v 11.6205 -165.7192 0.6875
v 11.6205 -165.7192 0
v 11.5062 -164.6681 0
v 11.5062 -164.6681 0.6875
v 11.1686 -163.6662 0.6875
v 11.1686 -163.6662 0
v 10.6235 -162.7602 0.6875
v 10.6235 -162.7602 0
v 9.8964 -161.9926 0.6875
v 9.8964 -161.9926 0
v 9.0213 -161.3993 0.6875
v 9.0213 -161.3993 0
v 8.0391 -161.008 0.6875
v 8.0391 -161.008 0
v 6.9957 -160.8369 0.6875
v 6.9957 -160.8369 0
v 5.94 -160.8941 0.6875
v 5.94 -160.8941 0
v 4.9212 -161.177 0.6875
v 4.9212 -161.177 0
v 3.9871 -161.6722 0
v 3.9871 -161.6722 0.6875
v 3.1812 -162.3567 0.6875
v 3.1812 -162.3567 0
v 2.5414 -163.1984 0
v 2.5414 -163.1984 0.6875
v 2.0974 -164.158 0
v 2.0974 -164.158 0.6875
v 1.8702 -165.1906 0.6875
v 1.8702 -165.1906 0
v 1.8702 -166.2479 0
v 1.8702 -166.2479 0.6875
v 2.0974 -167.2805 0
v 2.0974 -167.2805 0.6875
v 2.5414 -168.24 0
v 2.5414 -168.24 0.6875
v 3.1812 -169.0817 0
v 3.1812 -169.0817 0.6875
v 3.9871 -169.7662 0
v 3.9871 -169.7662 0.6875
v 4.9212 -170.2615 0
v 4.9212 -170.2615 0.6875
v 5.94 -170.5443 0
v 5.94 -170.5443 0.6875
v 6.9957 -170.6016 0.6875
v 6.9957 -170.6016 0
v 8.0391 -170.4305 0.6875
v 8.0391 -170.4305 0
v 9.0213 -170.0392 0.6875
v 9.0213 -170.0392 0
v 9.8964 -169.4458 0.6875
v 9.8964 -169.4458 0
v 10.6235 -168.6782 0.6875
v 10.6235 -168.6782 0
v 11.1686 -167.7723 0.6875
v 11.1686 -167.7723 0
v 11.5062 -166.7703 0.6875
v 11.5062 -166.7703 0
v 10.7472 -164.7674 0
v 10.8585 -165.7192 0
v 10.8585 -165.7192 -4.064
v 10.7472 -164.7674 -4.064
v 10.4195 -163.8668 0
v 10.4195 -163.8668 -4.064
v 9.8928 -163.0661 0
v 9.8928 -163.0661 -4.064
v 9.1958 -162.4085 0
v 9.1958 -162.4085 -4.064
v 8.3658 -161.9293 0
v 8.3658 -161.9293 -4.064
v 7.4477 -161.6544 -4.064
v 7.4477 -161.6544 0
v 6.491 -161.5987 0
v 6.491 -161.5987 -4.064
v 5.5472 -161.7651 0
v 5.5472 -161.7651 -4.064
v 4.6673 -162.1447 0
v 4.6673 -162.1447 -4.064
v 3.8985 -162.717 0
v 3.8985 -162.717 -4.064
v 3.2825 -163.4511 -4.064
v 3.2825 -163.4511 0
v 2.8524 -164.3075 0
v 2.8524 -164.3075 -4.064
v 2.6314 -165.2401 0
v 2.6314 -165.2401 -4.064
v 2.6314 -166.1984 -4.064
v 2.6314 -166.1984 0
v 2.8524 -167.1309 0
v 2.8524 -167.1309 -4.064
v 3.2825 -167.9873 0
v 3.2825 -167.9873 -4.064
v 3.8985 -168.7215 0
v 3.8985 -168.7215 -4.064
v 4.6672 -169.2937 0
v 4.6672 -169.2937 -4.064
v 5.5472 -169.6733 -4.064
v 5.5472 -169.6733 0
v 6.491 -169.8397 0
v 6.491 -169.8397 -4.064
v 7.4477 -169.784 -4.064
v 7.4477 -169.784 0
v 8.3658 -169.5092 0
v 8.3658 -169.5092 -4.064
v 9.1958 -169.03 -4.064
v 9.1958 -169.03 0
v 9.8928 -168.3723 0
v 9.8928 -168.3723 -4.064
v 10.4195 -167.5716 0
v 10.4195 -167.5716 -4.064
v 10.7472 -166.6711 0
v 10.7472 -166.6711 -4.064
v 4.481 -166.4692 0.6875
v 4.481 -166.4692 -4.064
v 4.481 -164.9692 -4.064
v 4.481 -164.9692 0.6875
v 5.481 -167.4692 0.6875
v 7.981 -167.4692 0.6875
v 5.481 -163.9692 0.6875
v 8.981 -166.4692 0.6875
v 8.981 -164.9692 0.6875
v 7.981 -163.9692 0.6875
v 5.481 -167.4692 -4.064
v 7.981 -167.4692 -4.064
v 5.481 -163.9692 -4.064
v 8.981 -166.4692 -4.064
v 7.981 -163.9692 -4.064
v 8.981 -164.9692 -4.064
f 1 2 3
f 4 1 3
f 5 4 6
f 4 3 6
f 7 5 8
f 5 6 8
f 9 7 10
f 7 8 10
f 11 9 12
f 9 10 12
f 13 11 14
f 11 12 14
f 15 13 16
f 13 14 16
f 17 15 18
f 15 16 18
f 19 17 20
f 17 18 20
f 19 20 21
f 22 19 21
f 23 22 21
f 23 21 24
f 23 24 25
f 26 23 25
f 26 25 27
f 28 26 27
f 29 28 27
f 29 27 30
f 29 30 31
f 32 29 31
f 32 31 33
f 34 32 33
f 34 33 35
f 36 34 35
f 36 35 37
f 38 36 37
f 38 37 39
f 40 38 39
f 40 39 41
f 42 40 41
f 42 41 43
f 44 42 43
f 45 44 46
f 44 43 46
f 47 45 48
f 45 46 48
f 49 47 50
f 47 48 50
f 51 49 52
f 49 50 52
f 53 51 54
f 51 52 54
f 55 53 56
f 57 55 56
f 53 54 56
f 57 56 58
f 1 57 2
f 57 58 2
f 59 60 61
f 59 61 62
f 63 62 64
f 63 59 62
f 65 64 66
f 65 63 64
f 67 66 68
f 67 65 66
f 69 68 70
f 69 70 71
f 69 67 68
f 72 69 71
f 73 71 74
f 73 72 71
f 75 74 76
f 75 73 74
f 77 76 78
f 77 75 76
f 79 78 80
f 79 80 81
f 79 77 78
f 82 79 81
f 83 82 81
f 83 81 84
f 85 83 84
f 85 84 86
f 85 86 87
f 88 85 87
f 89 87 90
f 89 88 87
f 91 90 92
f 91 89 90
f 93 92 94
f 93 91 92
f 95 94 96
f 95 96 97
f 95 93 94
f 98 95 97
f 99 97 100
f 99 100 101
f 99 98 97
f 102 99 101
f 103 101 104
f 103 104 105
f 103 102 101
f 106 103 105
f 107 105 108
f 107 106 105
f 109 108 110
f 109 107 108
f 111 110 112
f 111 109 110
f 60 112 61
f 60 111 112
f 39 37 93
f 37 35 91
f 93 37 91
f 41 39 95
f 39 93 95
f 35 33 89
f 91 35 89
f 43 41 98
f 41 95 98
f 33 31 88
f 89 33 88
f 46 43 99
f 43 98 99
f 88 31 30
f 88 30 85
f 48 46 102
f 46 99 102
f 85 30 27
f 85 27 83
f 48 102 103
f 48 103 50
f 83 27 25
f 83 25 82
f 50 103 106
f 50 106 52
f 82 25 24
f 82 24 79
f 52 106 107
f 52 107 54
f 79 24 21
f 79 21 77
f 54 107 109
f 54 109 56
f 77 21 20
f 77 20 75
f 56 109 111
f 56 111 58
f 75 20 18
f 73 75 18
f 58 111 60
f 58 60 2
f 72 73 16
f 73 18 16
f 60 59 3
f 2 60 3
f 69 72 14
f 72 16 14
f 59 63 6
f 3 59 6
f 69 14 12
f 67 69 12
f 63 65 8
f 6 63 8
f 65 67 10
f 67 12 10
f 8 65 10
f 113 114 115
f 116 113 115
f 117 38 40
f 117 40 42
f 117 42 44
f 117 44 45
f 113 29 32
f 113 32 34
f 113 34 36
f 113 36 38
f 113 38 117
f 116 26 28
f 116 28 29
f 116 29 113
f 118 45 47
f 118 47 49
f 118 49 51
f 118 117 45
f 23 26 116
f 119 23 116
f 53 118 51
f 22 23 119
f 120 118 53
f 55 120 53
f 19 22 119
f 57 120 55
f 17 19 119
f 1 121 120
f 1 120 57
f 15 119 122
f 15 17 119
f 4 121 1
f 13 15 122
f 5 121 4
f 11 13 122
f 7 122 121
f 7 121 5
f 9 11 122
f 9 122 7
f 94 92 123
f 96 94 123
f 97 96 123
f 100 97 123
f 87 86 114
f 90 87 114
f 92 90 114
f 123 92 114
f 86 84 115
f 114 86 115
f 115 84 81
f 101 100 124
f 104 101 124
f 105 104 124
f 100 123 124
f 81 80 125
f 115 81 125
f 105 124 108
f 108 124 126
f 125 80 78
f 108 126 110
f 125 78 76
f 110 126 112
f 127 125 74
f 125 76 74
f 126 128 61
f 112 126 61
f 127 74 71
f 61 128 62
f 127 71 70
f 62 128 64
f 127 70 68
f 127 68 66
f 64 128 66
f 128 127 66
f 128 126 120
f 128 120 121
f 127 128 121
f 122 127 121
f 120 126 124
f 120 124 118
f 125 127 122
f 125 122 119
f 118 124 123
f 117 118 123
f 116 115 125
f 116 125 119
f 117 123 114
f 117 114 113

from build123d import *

# Parameters (mm, degrees)
SKETCH1_R           = 4.1275
BOSS_EXTRUDE2_DEPTH = 4.064
SKETCH2_R           = 4.8895
BOSS_EXTRUDE3_DEPTH = 1.5875
SKETCH7_W           = 4.5
SKETCH7_H           = 3.5
CUT_EXTRUDE2_DEPTH  = 6.6515
CHAMFER1_SIZE       = 1
SKETCH8_R           = 4.8895
CUT_EXTRUDE3_DEPTH  = 0.9


with BuildPart() as part:
    # Sketch1 → Boss-Extrude2 (new body)
    with BuildSketch(Plane.XY):
        with Locations((6.731, -165.7192297)):
            Circle(SKETCH1_R)
    extrude(amount=-BOSS_EXTRUDE2_DEPTH)

    # Sketch2 → Boss-Extrude3 (add)
    with BuildSketch(Plane.XY):
        with Locations((6.731, -165.7192297)):
            Circle(SKETCH2_R)
    extrude(amount=BOSS_EXTRUDE3_DEPTH)

    # Sketch7 → Cut-Extrude2 (cut, through all)
    with BuildSketch(Plane(origin=(0, 0, -4.064), x_dir=(-1, 0, 0), z_dir=(0, 0, -1))):
        with Locations((-6.731, -165.7192297)):
            Rectangle(SKETCH7_W, SKETCH7_H)
    extrude(amount=-CUT_EXTRUDE2_DEPTH, mode=Mode.SUBTRACT)

    # Chamfer1
    chamfer1_edges = [part.edges().sort_by_distance(p)[0] for p in [
        (4.481, -163.9692297, -1.23825),
        (4.481, -167.4692297, -1.23825),
        (8.981, -167.4692297, -1.23825),
        (8.981, -163.9692297, -1.23825),
    ]]
    chamfer(chamfer1_edges, length=CHAMFER1_SIZE)

    # Sketch8 → Cut-Extrude3 (cut)
    with BuildSketch(Plane.XY.offset(1.5875)):
        with Locations((6.731, -165.7192297)):
            Circle(SKETCH8_R)
    extrude(amount=-CUT_EXTRUDE3_DEPTH, mode=Mode.SUBTRACT)


solid = part.part
